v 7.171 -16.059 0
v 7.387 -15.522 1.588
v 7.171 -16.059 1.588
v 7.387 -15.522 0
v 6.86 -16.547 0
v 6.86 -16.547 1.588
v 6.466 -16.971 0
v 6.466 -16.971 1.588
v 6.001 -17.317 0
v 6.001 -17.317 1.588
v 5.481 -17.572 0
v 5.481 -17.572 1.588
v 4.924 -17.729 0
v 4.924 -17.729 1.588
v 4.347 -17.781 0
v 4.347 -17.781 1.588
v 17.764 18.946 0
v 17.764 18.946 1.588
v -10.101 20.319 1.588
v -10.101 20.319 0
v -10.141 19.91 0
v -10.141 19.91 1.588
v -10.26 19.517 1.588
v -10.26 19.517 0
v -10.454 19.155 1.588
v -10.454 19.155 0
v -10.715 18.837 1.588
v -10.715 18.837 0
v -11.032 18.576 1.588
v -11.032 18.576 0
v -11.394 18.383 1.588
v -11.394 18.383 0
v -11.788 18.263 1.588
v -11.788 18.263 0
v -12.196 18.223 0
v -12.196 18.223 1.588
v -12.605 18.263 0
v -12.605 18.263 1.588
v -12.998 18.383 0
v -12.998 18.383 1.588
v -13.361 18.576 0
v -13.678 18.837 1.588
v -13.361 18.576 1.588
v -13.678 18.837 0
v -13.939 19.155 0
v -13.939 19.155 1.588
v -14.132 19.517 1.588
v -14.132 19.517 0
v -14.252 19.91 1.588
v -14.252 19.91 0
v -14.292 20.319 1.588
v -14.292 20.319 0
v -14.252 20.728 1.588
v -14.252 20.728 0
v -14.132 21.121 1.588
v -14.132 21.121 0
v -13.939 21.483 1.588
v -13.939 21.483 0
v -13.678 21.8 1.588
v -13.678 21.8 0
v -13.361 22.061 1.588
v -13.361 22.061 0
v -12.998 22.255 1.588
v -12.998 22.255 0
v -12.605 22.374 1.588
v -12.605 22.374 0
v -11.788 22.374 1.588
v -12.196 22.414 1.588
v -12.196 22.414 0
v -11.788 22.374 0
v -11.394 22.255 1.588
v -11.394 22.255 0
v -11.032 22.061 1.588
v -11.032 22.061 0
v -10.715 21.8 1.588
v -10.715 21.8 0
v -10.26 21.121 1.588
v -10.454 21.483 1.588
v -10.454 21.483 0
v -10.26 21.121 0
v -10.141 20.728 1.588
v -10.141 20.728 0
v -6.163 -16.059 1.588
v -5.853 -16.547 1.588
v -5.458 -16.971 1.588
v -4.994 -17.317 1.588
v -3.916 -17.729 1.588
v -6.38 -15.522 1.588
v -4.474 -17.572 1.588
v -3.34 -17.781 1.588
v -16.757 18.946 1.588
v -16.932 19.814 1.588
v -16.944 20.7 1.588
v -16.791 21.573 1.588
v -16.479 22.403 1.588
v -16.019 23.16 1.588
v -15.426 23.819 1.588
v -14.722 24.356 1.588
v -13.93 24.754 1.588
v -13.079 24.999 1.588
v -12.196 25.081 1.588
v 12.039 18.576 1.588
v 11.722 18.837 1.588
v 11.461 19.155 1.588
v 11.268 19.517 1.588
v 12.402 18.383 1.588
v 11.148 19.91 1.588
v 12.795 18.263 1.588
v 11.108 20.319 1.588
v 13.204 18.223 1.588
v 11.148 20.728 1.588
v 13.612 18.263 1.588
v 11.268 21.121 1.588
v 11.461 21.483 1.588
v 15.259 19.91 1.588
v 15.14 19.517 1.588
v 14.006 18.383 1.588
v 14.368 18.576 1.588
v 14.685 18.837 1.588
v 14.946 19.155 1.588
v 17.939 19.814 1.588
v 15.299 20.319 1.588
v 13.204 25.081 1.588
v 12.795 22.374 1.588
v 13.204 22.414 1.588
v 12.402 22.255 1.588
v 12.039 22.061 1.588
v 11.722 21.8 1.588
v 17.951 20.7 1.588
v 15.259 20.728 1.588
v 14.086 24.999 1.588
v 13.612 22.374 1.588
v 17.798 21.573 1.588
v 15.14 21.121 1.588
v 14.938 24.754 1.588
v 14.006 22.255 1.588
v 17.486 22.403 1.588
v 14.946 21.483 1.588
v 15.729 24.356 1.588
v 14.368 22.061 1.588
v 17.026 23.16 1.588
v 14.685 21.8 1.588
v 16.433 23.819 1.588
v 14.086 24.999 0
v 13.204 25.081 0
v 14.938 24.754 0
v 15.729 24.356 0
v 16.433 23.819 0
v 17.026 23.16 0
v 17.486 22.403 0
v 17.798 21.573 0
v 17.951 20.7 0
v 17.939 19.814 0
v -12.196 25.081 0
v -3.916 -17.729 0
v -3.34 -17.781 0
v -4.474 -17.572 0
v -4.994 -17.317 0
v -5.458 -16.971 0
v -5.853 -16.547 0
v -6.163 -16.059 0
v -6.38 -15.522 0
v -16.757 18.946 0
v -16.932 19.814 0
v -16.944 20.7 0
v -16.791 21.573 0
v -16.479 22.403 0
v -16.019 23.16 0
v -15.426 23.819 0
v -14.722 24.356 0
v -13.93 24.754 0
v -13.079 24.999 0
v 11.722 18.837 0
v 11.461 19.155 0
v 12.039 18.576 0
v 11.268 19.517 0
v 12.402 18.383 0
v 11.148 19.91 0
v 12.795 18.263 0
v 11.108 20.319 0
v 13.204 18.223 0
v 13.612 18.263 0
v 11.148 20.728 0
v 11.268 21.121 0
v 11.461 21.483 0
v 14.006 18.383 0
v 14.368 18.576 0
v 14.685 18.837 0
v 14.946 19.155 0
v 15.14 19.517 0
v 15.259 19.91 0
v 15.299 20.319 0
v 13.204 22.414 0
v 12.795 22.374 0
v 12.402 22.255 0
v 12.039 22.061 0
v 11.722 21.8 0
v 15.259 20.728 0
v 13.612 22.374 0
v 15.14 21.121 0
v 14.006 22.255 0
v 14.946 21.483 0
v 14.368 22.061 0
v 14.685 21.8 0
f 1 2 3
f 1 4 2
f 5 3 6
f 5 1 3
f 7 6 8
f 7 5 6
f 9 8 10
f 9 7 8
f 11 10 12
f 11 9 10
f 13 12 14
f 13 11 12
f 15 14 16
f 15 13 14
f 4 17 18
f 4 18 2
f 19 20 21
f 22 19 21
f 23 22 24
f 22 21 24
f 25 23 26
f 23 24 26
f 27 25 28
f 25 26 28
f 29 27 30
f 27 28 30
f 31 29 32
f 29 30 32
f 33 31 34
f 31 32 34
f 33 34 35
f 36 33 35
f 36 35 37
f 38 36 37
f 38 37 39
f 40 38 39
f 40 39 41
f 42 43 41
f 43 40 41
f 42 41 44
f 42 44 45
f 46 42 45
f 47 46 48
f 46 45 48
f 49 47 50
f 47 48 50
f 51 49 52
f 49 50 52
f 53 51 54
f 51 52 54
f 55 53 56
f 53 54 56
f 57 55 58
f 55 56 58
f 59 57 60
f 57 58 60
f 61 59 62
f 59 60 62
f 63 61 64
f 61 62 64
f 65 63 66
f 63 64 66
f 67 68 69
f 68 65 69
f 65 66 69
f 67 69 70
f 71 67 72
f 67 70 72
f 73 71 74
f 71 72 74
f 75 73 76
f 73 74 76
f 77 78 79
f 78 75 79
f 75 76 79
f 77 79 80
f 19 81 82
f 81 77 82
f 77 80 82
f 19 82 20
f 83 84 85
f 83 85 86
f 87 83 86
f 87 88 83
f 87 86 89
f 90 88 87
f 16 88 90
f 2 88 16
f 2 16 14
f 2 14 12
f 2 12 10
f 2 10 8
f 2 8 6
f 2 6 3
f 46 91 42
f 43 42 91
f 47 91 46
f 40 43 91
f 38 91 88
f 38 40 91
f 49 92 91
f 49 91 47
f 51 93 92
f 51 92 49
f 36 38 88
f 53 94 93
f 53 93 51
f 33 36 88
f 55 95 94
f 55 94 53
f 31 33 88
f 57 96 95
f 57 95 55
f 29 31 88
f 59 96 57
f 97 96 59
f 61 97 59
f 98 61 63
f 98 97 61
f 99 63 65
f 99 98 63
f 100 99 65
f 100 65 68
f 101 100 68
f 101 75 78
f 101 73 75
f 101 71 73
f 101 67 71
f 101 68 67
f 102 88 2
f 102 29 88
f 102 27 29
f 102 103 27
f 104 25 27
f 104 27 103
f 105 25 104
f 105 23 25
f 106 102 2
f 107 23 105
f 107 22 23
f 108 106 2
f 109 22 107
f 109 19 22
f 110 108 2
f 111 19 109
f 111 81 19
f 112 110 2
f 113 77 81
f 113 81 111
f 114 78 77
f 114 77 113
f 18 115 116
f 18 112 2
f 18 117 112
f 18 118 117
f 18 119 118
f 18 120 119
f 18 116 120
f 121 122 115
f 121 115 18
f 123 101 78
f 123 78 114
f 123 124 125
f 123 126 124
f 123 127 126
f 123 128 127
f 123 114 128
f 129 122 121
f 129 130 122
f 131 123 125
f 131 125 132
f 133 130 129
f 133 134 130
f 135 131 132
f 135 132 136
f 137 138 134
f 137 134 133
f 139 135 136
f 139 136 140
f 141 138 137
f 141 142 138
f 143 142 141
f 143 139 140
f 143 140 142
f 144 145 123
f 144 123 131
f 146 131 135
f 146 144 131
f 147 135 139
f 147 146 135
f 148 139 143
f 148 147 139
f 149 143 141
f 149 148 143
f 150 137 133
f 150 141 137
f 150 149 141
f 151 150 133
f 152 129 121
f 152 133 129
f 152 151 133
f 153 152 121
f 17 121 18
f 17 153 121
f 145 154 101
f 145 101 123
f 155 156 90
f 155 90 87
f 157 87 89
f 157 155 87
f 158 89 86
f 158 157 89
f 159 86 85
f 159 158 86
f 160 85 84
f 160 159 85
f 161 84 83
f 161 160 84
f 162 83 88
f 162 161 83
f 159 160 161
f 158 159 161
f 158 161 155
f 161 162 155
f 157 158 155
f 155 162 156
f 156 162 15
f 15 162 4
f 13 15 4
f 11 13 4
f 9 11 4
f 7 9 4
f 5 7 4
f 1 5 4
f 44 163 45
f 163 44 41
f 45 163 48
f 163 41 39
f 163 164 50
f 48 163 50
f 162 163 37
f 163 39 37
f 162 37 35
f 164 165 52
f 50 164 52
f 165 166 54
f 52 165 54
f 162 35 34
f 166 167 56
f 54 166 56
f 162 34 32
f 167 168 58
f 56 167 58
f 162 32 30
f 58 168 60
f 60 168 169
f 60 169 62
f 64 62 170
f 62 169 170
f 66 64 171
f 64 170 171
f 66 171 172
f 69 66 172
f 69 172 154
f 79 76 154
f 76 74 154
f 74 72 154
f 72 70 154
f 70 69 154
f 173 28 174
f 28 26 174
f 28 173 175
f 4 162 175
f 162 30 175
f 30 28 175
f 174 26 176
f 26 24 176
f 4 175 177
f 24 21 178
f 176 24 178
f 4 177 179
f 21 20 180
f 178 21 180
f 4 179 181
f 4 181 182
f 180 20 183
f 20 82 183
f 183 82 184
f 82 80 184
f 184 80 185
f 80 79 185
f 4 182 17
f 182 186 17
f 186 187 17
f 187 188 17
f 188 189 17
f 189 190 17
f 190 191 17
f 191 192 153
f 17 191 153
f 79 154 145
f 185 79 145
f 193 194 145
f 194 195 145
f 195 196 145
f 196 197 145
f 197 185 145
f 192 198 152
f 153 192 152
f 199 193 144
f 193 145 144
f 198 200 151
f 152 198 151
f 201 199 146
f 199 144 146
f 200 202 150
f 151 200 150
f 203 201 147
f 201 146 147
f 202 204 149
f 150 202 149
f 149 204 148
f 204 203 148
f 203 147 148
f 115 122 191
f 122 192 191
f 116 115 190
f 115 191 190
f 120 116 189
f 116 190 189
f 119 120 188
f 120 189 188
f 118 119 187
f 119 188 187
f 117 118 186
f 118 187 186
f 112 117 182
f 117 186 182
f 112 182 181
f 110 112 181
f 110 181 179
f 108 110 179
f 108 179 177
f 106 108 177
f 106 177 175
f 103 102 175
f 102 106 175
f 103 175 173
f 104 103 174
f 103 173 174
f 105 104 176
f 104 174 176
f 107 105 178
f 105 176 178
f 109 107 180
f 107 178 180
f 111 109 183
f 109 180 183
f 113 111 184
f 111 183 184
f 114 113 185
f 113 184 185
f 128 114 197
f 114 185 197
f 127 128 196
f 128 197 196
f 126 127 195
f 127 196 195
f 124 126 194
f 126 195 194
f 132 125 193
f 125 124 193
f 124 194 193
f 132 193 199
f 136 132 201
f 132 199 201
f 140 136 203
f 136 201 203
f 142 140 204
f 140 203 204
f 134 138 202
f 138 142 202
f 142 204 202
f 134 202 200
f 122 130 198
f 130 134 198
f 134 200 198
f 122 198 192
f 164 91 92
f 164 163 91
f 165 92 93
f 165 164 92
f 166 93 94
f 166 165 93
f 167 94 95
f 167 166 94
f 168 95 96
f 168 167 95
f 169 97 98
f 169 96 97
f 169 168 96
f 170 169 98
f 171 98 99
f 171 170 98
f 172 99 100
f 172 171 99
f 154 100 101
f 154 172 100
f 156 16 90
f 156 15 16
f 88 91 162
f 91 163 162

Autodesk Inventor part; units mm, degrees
ref_plane "YZ Plane" through (0, 0, 0) normal (1, 0, 0) x (0, 1, 0)
ref_plane "XZ Plane" through (0, 0, 0) normal (0, 1, 0) x (-1, 0, 0)
ref_plane "XY Plane" through (0, 0, 0) normal (0, 0, 1) x (1, 0, 0)
sketch "Sketch1" plane through (0, 0, 0) normal (0, 0, 1) x (1, 0, 0)
  circle A0 centre (13.2036, 20.3187) radius 2.0955
  circle A1 centre (-12.1964, 20.3187) radius 2.0955
  line L0 (4.3471, -17.7813) -> (-3.3398, -17.7813)
  arc A2 (4.3471, -17.7813) -> (7.3873, -15.5216) centre (4.3471, -14.6063) ccw
  arc A3 (-6.38, -15.5216) -> (-3.3398, -17.7813) centre (-3.3398, -14.6063) ccw
  line L1 (-16.7567, 18.9458) -> (-6.38, -15.5216)
  line L2 (17.764, 18.9458) -> (7.3873, -15.5216)
  arc A4 (-12.1964, 25.0812) -> (-16.7567, 18.9458) centre (-12.1964, 20.3187) ccw
  arc A5 (17.764, 18.9458) -> (13.2036, 25.0812) centre (13.2036, 20.3187) ccw
  line L3 (-12.1964, 25.0812) -> (13.2036, 25.0812)
  point P0 (0, 0)
  point P1 (-12.1964, 25.0812)
  point P2 (17.4758, 18.214)
  point P3 (-16.4686, 18.214)
  dimension "d1" = 3.175
  dimension "d8" = 4.191
  dimension "d9" = 4.191
  dimension "d25" = 9.525
  dimension "d26" = 9.525
extrude "Extrusion1" add sketch "Sketch1" along normal blind 1.5875
equation "\"BendRadius\" = Thickness"
equation "\"BendReliefWidth\" = Thickness"
equation "\"BendReliefDepth\" = 0.5 * Thickness"
equation "\"CornerReliefSize\" = 4 * Thickness"
equation "\"MinimumRemnant\" = 2 * Thickness"
equation "\"TransitionRadius\" = BendRadius"
equation "\"JacobiRadiusSize\" = BendRadius"
equation "\"GapSize\" = Thickness"
equation "\"Thickness\" = 1.5875"
properties part number "Hook Gussett" material "Acetal Resin, White"
